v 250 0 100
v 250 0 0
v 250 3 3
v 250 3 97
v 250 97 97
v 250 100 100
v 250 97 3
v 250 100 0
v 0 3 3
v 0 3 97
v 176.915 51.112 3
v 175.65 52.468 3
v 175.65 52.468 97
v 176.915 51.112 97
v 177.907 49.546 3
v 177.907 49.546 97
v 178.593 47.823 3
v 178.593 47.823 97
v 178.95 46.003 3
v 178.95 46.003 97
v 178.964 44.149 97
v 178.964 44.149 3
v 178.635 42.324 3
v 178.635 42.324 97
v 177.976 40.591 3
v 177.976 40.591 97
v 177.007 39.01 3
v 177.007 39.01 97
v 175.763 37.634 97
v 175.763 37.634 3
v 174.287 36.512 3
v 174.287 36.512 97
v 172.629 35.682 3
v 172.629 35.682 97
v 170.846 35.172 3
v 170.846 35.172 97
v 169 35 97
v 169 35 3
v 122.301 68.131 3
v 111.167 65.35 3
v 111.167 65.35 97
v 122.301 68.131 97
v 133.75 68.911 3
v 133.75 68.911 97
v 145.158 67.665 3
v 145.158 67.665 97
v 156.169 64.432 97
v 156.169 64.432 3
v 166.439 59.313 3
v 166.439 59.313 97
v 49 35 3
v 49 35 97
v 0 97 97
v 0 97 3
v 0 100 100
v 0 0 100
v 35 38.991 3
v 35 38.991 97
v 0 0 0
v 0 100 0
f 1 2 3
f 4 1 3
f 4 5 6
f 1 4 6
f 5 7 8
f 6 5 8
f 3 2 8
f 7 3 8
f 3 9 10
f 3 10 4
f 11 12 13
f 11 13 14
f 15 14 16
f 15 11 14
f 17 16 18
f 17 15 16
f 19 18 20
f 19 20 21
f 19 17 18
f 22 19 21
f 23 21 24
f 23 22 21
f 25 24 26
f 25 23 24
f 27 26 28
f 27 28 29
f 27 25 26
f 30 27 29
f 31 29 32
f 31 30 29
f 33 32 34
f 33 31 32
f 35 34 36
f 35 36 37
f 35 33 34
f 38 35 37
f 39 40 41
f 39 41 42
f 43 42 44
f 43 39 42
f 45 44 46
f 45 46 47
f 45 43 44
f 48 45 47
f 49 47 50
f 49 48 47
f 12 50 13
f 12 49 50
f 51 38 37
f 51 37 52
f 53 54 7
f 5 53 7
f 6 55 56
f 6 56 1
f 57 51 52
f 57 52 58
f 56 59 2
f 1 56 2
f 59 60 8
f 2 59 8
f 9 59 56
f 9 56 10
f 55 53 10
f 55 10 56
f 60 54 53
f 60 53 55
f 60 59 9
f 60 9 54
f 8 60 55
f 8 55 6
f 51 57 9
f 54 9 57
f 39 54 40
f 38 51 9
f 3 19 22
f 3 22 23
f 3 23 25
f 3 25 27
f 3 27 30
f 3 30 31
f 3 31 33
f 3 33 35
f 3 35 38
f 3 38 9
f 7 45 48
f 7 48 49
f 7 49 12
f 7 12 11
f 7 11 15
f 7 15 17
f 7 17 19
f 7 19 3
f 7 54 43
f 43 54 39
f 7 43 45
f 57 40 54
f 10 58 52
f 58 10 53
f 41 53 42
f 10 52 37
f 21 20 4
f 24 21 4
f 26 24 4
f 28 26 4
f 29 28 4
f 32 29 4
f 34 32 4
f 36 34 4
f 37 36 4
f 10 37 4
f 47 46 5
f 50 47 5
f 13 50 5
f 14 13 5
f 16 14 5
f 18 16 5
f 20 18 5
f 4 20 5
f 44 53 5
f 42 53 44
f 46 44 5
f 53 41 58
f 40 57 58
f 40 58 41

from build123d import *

# Parameters (mm, degrees)
CROQUIS1_W              = 250
CROQUIS1_H              = 100
SALIENTE_EXTRUIR1_DEPTH = 100
VACIADO1_T              = -3
SALIENTE_EXTRUIR2_REACH = 99


with BuildPart() as part:
    # Croquis1 → Saliente-Extruir1 (new body)
    with BuildSketch(Plane.XY):
        with Locations((125, 50)):
            Rectangle(CROQUIS1_W, CROQUIS1_H)
    extrude(amount=SALIENTE_EXTRUIR1_DEPTH)

    # Vaciado1
    vaciado1_openings = [part.faces().sort_by_distance(p)[0] for p in [
        (250, 50, 50),
        (0, 50, 50),
    ]]
    offset(amount=VACIADO1_T, openings=vaciado1_openings, kind=Kind.INTERSECTION)

    # Croquis2 → Saliente-Extruir2 (add, up to next)
    with BuildSketch(Plane.XY.offset(3), mode=Mode.PRIVATE) as saliente_extruir2_sk1:
        with BuildLine():
            Line((35, 38.990872976), (111.166875619, 65.349857161))
            ThreePointArc((111.166875619, 65.349857161), (145.157572396, 67.664766629), (175.650108959, 52.46833655))
            ThreePointArc((175.650108959, 52.46833655), (178.345677223, 41.442147101), (169, 35))
            Line((169, 35), (49, 35))
            Line((49, 35), (35, 38.990872976))
        make_face()
    saliente_extruir2_tool1 = extrude(saliente_extruir2_sk1.sketch, amount=SALIENTE_EXTRUIR2_REACH, mode=Mode.PRIVATE) - part.part
    add(saliente_extruir2_tool1.solids().sort_by_distance((118.929072, 48.395279, 3))[0])


solid = part.part
